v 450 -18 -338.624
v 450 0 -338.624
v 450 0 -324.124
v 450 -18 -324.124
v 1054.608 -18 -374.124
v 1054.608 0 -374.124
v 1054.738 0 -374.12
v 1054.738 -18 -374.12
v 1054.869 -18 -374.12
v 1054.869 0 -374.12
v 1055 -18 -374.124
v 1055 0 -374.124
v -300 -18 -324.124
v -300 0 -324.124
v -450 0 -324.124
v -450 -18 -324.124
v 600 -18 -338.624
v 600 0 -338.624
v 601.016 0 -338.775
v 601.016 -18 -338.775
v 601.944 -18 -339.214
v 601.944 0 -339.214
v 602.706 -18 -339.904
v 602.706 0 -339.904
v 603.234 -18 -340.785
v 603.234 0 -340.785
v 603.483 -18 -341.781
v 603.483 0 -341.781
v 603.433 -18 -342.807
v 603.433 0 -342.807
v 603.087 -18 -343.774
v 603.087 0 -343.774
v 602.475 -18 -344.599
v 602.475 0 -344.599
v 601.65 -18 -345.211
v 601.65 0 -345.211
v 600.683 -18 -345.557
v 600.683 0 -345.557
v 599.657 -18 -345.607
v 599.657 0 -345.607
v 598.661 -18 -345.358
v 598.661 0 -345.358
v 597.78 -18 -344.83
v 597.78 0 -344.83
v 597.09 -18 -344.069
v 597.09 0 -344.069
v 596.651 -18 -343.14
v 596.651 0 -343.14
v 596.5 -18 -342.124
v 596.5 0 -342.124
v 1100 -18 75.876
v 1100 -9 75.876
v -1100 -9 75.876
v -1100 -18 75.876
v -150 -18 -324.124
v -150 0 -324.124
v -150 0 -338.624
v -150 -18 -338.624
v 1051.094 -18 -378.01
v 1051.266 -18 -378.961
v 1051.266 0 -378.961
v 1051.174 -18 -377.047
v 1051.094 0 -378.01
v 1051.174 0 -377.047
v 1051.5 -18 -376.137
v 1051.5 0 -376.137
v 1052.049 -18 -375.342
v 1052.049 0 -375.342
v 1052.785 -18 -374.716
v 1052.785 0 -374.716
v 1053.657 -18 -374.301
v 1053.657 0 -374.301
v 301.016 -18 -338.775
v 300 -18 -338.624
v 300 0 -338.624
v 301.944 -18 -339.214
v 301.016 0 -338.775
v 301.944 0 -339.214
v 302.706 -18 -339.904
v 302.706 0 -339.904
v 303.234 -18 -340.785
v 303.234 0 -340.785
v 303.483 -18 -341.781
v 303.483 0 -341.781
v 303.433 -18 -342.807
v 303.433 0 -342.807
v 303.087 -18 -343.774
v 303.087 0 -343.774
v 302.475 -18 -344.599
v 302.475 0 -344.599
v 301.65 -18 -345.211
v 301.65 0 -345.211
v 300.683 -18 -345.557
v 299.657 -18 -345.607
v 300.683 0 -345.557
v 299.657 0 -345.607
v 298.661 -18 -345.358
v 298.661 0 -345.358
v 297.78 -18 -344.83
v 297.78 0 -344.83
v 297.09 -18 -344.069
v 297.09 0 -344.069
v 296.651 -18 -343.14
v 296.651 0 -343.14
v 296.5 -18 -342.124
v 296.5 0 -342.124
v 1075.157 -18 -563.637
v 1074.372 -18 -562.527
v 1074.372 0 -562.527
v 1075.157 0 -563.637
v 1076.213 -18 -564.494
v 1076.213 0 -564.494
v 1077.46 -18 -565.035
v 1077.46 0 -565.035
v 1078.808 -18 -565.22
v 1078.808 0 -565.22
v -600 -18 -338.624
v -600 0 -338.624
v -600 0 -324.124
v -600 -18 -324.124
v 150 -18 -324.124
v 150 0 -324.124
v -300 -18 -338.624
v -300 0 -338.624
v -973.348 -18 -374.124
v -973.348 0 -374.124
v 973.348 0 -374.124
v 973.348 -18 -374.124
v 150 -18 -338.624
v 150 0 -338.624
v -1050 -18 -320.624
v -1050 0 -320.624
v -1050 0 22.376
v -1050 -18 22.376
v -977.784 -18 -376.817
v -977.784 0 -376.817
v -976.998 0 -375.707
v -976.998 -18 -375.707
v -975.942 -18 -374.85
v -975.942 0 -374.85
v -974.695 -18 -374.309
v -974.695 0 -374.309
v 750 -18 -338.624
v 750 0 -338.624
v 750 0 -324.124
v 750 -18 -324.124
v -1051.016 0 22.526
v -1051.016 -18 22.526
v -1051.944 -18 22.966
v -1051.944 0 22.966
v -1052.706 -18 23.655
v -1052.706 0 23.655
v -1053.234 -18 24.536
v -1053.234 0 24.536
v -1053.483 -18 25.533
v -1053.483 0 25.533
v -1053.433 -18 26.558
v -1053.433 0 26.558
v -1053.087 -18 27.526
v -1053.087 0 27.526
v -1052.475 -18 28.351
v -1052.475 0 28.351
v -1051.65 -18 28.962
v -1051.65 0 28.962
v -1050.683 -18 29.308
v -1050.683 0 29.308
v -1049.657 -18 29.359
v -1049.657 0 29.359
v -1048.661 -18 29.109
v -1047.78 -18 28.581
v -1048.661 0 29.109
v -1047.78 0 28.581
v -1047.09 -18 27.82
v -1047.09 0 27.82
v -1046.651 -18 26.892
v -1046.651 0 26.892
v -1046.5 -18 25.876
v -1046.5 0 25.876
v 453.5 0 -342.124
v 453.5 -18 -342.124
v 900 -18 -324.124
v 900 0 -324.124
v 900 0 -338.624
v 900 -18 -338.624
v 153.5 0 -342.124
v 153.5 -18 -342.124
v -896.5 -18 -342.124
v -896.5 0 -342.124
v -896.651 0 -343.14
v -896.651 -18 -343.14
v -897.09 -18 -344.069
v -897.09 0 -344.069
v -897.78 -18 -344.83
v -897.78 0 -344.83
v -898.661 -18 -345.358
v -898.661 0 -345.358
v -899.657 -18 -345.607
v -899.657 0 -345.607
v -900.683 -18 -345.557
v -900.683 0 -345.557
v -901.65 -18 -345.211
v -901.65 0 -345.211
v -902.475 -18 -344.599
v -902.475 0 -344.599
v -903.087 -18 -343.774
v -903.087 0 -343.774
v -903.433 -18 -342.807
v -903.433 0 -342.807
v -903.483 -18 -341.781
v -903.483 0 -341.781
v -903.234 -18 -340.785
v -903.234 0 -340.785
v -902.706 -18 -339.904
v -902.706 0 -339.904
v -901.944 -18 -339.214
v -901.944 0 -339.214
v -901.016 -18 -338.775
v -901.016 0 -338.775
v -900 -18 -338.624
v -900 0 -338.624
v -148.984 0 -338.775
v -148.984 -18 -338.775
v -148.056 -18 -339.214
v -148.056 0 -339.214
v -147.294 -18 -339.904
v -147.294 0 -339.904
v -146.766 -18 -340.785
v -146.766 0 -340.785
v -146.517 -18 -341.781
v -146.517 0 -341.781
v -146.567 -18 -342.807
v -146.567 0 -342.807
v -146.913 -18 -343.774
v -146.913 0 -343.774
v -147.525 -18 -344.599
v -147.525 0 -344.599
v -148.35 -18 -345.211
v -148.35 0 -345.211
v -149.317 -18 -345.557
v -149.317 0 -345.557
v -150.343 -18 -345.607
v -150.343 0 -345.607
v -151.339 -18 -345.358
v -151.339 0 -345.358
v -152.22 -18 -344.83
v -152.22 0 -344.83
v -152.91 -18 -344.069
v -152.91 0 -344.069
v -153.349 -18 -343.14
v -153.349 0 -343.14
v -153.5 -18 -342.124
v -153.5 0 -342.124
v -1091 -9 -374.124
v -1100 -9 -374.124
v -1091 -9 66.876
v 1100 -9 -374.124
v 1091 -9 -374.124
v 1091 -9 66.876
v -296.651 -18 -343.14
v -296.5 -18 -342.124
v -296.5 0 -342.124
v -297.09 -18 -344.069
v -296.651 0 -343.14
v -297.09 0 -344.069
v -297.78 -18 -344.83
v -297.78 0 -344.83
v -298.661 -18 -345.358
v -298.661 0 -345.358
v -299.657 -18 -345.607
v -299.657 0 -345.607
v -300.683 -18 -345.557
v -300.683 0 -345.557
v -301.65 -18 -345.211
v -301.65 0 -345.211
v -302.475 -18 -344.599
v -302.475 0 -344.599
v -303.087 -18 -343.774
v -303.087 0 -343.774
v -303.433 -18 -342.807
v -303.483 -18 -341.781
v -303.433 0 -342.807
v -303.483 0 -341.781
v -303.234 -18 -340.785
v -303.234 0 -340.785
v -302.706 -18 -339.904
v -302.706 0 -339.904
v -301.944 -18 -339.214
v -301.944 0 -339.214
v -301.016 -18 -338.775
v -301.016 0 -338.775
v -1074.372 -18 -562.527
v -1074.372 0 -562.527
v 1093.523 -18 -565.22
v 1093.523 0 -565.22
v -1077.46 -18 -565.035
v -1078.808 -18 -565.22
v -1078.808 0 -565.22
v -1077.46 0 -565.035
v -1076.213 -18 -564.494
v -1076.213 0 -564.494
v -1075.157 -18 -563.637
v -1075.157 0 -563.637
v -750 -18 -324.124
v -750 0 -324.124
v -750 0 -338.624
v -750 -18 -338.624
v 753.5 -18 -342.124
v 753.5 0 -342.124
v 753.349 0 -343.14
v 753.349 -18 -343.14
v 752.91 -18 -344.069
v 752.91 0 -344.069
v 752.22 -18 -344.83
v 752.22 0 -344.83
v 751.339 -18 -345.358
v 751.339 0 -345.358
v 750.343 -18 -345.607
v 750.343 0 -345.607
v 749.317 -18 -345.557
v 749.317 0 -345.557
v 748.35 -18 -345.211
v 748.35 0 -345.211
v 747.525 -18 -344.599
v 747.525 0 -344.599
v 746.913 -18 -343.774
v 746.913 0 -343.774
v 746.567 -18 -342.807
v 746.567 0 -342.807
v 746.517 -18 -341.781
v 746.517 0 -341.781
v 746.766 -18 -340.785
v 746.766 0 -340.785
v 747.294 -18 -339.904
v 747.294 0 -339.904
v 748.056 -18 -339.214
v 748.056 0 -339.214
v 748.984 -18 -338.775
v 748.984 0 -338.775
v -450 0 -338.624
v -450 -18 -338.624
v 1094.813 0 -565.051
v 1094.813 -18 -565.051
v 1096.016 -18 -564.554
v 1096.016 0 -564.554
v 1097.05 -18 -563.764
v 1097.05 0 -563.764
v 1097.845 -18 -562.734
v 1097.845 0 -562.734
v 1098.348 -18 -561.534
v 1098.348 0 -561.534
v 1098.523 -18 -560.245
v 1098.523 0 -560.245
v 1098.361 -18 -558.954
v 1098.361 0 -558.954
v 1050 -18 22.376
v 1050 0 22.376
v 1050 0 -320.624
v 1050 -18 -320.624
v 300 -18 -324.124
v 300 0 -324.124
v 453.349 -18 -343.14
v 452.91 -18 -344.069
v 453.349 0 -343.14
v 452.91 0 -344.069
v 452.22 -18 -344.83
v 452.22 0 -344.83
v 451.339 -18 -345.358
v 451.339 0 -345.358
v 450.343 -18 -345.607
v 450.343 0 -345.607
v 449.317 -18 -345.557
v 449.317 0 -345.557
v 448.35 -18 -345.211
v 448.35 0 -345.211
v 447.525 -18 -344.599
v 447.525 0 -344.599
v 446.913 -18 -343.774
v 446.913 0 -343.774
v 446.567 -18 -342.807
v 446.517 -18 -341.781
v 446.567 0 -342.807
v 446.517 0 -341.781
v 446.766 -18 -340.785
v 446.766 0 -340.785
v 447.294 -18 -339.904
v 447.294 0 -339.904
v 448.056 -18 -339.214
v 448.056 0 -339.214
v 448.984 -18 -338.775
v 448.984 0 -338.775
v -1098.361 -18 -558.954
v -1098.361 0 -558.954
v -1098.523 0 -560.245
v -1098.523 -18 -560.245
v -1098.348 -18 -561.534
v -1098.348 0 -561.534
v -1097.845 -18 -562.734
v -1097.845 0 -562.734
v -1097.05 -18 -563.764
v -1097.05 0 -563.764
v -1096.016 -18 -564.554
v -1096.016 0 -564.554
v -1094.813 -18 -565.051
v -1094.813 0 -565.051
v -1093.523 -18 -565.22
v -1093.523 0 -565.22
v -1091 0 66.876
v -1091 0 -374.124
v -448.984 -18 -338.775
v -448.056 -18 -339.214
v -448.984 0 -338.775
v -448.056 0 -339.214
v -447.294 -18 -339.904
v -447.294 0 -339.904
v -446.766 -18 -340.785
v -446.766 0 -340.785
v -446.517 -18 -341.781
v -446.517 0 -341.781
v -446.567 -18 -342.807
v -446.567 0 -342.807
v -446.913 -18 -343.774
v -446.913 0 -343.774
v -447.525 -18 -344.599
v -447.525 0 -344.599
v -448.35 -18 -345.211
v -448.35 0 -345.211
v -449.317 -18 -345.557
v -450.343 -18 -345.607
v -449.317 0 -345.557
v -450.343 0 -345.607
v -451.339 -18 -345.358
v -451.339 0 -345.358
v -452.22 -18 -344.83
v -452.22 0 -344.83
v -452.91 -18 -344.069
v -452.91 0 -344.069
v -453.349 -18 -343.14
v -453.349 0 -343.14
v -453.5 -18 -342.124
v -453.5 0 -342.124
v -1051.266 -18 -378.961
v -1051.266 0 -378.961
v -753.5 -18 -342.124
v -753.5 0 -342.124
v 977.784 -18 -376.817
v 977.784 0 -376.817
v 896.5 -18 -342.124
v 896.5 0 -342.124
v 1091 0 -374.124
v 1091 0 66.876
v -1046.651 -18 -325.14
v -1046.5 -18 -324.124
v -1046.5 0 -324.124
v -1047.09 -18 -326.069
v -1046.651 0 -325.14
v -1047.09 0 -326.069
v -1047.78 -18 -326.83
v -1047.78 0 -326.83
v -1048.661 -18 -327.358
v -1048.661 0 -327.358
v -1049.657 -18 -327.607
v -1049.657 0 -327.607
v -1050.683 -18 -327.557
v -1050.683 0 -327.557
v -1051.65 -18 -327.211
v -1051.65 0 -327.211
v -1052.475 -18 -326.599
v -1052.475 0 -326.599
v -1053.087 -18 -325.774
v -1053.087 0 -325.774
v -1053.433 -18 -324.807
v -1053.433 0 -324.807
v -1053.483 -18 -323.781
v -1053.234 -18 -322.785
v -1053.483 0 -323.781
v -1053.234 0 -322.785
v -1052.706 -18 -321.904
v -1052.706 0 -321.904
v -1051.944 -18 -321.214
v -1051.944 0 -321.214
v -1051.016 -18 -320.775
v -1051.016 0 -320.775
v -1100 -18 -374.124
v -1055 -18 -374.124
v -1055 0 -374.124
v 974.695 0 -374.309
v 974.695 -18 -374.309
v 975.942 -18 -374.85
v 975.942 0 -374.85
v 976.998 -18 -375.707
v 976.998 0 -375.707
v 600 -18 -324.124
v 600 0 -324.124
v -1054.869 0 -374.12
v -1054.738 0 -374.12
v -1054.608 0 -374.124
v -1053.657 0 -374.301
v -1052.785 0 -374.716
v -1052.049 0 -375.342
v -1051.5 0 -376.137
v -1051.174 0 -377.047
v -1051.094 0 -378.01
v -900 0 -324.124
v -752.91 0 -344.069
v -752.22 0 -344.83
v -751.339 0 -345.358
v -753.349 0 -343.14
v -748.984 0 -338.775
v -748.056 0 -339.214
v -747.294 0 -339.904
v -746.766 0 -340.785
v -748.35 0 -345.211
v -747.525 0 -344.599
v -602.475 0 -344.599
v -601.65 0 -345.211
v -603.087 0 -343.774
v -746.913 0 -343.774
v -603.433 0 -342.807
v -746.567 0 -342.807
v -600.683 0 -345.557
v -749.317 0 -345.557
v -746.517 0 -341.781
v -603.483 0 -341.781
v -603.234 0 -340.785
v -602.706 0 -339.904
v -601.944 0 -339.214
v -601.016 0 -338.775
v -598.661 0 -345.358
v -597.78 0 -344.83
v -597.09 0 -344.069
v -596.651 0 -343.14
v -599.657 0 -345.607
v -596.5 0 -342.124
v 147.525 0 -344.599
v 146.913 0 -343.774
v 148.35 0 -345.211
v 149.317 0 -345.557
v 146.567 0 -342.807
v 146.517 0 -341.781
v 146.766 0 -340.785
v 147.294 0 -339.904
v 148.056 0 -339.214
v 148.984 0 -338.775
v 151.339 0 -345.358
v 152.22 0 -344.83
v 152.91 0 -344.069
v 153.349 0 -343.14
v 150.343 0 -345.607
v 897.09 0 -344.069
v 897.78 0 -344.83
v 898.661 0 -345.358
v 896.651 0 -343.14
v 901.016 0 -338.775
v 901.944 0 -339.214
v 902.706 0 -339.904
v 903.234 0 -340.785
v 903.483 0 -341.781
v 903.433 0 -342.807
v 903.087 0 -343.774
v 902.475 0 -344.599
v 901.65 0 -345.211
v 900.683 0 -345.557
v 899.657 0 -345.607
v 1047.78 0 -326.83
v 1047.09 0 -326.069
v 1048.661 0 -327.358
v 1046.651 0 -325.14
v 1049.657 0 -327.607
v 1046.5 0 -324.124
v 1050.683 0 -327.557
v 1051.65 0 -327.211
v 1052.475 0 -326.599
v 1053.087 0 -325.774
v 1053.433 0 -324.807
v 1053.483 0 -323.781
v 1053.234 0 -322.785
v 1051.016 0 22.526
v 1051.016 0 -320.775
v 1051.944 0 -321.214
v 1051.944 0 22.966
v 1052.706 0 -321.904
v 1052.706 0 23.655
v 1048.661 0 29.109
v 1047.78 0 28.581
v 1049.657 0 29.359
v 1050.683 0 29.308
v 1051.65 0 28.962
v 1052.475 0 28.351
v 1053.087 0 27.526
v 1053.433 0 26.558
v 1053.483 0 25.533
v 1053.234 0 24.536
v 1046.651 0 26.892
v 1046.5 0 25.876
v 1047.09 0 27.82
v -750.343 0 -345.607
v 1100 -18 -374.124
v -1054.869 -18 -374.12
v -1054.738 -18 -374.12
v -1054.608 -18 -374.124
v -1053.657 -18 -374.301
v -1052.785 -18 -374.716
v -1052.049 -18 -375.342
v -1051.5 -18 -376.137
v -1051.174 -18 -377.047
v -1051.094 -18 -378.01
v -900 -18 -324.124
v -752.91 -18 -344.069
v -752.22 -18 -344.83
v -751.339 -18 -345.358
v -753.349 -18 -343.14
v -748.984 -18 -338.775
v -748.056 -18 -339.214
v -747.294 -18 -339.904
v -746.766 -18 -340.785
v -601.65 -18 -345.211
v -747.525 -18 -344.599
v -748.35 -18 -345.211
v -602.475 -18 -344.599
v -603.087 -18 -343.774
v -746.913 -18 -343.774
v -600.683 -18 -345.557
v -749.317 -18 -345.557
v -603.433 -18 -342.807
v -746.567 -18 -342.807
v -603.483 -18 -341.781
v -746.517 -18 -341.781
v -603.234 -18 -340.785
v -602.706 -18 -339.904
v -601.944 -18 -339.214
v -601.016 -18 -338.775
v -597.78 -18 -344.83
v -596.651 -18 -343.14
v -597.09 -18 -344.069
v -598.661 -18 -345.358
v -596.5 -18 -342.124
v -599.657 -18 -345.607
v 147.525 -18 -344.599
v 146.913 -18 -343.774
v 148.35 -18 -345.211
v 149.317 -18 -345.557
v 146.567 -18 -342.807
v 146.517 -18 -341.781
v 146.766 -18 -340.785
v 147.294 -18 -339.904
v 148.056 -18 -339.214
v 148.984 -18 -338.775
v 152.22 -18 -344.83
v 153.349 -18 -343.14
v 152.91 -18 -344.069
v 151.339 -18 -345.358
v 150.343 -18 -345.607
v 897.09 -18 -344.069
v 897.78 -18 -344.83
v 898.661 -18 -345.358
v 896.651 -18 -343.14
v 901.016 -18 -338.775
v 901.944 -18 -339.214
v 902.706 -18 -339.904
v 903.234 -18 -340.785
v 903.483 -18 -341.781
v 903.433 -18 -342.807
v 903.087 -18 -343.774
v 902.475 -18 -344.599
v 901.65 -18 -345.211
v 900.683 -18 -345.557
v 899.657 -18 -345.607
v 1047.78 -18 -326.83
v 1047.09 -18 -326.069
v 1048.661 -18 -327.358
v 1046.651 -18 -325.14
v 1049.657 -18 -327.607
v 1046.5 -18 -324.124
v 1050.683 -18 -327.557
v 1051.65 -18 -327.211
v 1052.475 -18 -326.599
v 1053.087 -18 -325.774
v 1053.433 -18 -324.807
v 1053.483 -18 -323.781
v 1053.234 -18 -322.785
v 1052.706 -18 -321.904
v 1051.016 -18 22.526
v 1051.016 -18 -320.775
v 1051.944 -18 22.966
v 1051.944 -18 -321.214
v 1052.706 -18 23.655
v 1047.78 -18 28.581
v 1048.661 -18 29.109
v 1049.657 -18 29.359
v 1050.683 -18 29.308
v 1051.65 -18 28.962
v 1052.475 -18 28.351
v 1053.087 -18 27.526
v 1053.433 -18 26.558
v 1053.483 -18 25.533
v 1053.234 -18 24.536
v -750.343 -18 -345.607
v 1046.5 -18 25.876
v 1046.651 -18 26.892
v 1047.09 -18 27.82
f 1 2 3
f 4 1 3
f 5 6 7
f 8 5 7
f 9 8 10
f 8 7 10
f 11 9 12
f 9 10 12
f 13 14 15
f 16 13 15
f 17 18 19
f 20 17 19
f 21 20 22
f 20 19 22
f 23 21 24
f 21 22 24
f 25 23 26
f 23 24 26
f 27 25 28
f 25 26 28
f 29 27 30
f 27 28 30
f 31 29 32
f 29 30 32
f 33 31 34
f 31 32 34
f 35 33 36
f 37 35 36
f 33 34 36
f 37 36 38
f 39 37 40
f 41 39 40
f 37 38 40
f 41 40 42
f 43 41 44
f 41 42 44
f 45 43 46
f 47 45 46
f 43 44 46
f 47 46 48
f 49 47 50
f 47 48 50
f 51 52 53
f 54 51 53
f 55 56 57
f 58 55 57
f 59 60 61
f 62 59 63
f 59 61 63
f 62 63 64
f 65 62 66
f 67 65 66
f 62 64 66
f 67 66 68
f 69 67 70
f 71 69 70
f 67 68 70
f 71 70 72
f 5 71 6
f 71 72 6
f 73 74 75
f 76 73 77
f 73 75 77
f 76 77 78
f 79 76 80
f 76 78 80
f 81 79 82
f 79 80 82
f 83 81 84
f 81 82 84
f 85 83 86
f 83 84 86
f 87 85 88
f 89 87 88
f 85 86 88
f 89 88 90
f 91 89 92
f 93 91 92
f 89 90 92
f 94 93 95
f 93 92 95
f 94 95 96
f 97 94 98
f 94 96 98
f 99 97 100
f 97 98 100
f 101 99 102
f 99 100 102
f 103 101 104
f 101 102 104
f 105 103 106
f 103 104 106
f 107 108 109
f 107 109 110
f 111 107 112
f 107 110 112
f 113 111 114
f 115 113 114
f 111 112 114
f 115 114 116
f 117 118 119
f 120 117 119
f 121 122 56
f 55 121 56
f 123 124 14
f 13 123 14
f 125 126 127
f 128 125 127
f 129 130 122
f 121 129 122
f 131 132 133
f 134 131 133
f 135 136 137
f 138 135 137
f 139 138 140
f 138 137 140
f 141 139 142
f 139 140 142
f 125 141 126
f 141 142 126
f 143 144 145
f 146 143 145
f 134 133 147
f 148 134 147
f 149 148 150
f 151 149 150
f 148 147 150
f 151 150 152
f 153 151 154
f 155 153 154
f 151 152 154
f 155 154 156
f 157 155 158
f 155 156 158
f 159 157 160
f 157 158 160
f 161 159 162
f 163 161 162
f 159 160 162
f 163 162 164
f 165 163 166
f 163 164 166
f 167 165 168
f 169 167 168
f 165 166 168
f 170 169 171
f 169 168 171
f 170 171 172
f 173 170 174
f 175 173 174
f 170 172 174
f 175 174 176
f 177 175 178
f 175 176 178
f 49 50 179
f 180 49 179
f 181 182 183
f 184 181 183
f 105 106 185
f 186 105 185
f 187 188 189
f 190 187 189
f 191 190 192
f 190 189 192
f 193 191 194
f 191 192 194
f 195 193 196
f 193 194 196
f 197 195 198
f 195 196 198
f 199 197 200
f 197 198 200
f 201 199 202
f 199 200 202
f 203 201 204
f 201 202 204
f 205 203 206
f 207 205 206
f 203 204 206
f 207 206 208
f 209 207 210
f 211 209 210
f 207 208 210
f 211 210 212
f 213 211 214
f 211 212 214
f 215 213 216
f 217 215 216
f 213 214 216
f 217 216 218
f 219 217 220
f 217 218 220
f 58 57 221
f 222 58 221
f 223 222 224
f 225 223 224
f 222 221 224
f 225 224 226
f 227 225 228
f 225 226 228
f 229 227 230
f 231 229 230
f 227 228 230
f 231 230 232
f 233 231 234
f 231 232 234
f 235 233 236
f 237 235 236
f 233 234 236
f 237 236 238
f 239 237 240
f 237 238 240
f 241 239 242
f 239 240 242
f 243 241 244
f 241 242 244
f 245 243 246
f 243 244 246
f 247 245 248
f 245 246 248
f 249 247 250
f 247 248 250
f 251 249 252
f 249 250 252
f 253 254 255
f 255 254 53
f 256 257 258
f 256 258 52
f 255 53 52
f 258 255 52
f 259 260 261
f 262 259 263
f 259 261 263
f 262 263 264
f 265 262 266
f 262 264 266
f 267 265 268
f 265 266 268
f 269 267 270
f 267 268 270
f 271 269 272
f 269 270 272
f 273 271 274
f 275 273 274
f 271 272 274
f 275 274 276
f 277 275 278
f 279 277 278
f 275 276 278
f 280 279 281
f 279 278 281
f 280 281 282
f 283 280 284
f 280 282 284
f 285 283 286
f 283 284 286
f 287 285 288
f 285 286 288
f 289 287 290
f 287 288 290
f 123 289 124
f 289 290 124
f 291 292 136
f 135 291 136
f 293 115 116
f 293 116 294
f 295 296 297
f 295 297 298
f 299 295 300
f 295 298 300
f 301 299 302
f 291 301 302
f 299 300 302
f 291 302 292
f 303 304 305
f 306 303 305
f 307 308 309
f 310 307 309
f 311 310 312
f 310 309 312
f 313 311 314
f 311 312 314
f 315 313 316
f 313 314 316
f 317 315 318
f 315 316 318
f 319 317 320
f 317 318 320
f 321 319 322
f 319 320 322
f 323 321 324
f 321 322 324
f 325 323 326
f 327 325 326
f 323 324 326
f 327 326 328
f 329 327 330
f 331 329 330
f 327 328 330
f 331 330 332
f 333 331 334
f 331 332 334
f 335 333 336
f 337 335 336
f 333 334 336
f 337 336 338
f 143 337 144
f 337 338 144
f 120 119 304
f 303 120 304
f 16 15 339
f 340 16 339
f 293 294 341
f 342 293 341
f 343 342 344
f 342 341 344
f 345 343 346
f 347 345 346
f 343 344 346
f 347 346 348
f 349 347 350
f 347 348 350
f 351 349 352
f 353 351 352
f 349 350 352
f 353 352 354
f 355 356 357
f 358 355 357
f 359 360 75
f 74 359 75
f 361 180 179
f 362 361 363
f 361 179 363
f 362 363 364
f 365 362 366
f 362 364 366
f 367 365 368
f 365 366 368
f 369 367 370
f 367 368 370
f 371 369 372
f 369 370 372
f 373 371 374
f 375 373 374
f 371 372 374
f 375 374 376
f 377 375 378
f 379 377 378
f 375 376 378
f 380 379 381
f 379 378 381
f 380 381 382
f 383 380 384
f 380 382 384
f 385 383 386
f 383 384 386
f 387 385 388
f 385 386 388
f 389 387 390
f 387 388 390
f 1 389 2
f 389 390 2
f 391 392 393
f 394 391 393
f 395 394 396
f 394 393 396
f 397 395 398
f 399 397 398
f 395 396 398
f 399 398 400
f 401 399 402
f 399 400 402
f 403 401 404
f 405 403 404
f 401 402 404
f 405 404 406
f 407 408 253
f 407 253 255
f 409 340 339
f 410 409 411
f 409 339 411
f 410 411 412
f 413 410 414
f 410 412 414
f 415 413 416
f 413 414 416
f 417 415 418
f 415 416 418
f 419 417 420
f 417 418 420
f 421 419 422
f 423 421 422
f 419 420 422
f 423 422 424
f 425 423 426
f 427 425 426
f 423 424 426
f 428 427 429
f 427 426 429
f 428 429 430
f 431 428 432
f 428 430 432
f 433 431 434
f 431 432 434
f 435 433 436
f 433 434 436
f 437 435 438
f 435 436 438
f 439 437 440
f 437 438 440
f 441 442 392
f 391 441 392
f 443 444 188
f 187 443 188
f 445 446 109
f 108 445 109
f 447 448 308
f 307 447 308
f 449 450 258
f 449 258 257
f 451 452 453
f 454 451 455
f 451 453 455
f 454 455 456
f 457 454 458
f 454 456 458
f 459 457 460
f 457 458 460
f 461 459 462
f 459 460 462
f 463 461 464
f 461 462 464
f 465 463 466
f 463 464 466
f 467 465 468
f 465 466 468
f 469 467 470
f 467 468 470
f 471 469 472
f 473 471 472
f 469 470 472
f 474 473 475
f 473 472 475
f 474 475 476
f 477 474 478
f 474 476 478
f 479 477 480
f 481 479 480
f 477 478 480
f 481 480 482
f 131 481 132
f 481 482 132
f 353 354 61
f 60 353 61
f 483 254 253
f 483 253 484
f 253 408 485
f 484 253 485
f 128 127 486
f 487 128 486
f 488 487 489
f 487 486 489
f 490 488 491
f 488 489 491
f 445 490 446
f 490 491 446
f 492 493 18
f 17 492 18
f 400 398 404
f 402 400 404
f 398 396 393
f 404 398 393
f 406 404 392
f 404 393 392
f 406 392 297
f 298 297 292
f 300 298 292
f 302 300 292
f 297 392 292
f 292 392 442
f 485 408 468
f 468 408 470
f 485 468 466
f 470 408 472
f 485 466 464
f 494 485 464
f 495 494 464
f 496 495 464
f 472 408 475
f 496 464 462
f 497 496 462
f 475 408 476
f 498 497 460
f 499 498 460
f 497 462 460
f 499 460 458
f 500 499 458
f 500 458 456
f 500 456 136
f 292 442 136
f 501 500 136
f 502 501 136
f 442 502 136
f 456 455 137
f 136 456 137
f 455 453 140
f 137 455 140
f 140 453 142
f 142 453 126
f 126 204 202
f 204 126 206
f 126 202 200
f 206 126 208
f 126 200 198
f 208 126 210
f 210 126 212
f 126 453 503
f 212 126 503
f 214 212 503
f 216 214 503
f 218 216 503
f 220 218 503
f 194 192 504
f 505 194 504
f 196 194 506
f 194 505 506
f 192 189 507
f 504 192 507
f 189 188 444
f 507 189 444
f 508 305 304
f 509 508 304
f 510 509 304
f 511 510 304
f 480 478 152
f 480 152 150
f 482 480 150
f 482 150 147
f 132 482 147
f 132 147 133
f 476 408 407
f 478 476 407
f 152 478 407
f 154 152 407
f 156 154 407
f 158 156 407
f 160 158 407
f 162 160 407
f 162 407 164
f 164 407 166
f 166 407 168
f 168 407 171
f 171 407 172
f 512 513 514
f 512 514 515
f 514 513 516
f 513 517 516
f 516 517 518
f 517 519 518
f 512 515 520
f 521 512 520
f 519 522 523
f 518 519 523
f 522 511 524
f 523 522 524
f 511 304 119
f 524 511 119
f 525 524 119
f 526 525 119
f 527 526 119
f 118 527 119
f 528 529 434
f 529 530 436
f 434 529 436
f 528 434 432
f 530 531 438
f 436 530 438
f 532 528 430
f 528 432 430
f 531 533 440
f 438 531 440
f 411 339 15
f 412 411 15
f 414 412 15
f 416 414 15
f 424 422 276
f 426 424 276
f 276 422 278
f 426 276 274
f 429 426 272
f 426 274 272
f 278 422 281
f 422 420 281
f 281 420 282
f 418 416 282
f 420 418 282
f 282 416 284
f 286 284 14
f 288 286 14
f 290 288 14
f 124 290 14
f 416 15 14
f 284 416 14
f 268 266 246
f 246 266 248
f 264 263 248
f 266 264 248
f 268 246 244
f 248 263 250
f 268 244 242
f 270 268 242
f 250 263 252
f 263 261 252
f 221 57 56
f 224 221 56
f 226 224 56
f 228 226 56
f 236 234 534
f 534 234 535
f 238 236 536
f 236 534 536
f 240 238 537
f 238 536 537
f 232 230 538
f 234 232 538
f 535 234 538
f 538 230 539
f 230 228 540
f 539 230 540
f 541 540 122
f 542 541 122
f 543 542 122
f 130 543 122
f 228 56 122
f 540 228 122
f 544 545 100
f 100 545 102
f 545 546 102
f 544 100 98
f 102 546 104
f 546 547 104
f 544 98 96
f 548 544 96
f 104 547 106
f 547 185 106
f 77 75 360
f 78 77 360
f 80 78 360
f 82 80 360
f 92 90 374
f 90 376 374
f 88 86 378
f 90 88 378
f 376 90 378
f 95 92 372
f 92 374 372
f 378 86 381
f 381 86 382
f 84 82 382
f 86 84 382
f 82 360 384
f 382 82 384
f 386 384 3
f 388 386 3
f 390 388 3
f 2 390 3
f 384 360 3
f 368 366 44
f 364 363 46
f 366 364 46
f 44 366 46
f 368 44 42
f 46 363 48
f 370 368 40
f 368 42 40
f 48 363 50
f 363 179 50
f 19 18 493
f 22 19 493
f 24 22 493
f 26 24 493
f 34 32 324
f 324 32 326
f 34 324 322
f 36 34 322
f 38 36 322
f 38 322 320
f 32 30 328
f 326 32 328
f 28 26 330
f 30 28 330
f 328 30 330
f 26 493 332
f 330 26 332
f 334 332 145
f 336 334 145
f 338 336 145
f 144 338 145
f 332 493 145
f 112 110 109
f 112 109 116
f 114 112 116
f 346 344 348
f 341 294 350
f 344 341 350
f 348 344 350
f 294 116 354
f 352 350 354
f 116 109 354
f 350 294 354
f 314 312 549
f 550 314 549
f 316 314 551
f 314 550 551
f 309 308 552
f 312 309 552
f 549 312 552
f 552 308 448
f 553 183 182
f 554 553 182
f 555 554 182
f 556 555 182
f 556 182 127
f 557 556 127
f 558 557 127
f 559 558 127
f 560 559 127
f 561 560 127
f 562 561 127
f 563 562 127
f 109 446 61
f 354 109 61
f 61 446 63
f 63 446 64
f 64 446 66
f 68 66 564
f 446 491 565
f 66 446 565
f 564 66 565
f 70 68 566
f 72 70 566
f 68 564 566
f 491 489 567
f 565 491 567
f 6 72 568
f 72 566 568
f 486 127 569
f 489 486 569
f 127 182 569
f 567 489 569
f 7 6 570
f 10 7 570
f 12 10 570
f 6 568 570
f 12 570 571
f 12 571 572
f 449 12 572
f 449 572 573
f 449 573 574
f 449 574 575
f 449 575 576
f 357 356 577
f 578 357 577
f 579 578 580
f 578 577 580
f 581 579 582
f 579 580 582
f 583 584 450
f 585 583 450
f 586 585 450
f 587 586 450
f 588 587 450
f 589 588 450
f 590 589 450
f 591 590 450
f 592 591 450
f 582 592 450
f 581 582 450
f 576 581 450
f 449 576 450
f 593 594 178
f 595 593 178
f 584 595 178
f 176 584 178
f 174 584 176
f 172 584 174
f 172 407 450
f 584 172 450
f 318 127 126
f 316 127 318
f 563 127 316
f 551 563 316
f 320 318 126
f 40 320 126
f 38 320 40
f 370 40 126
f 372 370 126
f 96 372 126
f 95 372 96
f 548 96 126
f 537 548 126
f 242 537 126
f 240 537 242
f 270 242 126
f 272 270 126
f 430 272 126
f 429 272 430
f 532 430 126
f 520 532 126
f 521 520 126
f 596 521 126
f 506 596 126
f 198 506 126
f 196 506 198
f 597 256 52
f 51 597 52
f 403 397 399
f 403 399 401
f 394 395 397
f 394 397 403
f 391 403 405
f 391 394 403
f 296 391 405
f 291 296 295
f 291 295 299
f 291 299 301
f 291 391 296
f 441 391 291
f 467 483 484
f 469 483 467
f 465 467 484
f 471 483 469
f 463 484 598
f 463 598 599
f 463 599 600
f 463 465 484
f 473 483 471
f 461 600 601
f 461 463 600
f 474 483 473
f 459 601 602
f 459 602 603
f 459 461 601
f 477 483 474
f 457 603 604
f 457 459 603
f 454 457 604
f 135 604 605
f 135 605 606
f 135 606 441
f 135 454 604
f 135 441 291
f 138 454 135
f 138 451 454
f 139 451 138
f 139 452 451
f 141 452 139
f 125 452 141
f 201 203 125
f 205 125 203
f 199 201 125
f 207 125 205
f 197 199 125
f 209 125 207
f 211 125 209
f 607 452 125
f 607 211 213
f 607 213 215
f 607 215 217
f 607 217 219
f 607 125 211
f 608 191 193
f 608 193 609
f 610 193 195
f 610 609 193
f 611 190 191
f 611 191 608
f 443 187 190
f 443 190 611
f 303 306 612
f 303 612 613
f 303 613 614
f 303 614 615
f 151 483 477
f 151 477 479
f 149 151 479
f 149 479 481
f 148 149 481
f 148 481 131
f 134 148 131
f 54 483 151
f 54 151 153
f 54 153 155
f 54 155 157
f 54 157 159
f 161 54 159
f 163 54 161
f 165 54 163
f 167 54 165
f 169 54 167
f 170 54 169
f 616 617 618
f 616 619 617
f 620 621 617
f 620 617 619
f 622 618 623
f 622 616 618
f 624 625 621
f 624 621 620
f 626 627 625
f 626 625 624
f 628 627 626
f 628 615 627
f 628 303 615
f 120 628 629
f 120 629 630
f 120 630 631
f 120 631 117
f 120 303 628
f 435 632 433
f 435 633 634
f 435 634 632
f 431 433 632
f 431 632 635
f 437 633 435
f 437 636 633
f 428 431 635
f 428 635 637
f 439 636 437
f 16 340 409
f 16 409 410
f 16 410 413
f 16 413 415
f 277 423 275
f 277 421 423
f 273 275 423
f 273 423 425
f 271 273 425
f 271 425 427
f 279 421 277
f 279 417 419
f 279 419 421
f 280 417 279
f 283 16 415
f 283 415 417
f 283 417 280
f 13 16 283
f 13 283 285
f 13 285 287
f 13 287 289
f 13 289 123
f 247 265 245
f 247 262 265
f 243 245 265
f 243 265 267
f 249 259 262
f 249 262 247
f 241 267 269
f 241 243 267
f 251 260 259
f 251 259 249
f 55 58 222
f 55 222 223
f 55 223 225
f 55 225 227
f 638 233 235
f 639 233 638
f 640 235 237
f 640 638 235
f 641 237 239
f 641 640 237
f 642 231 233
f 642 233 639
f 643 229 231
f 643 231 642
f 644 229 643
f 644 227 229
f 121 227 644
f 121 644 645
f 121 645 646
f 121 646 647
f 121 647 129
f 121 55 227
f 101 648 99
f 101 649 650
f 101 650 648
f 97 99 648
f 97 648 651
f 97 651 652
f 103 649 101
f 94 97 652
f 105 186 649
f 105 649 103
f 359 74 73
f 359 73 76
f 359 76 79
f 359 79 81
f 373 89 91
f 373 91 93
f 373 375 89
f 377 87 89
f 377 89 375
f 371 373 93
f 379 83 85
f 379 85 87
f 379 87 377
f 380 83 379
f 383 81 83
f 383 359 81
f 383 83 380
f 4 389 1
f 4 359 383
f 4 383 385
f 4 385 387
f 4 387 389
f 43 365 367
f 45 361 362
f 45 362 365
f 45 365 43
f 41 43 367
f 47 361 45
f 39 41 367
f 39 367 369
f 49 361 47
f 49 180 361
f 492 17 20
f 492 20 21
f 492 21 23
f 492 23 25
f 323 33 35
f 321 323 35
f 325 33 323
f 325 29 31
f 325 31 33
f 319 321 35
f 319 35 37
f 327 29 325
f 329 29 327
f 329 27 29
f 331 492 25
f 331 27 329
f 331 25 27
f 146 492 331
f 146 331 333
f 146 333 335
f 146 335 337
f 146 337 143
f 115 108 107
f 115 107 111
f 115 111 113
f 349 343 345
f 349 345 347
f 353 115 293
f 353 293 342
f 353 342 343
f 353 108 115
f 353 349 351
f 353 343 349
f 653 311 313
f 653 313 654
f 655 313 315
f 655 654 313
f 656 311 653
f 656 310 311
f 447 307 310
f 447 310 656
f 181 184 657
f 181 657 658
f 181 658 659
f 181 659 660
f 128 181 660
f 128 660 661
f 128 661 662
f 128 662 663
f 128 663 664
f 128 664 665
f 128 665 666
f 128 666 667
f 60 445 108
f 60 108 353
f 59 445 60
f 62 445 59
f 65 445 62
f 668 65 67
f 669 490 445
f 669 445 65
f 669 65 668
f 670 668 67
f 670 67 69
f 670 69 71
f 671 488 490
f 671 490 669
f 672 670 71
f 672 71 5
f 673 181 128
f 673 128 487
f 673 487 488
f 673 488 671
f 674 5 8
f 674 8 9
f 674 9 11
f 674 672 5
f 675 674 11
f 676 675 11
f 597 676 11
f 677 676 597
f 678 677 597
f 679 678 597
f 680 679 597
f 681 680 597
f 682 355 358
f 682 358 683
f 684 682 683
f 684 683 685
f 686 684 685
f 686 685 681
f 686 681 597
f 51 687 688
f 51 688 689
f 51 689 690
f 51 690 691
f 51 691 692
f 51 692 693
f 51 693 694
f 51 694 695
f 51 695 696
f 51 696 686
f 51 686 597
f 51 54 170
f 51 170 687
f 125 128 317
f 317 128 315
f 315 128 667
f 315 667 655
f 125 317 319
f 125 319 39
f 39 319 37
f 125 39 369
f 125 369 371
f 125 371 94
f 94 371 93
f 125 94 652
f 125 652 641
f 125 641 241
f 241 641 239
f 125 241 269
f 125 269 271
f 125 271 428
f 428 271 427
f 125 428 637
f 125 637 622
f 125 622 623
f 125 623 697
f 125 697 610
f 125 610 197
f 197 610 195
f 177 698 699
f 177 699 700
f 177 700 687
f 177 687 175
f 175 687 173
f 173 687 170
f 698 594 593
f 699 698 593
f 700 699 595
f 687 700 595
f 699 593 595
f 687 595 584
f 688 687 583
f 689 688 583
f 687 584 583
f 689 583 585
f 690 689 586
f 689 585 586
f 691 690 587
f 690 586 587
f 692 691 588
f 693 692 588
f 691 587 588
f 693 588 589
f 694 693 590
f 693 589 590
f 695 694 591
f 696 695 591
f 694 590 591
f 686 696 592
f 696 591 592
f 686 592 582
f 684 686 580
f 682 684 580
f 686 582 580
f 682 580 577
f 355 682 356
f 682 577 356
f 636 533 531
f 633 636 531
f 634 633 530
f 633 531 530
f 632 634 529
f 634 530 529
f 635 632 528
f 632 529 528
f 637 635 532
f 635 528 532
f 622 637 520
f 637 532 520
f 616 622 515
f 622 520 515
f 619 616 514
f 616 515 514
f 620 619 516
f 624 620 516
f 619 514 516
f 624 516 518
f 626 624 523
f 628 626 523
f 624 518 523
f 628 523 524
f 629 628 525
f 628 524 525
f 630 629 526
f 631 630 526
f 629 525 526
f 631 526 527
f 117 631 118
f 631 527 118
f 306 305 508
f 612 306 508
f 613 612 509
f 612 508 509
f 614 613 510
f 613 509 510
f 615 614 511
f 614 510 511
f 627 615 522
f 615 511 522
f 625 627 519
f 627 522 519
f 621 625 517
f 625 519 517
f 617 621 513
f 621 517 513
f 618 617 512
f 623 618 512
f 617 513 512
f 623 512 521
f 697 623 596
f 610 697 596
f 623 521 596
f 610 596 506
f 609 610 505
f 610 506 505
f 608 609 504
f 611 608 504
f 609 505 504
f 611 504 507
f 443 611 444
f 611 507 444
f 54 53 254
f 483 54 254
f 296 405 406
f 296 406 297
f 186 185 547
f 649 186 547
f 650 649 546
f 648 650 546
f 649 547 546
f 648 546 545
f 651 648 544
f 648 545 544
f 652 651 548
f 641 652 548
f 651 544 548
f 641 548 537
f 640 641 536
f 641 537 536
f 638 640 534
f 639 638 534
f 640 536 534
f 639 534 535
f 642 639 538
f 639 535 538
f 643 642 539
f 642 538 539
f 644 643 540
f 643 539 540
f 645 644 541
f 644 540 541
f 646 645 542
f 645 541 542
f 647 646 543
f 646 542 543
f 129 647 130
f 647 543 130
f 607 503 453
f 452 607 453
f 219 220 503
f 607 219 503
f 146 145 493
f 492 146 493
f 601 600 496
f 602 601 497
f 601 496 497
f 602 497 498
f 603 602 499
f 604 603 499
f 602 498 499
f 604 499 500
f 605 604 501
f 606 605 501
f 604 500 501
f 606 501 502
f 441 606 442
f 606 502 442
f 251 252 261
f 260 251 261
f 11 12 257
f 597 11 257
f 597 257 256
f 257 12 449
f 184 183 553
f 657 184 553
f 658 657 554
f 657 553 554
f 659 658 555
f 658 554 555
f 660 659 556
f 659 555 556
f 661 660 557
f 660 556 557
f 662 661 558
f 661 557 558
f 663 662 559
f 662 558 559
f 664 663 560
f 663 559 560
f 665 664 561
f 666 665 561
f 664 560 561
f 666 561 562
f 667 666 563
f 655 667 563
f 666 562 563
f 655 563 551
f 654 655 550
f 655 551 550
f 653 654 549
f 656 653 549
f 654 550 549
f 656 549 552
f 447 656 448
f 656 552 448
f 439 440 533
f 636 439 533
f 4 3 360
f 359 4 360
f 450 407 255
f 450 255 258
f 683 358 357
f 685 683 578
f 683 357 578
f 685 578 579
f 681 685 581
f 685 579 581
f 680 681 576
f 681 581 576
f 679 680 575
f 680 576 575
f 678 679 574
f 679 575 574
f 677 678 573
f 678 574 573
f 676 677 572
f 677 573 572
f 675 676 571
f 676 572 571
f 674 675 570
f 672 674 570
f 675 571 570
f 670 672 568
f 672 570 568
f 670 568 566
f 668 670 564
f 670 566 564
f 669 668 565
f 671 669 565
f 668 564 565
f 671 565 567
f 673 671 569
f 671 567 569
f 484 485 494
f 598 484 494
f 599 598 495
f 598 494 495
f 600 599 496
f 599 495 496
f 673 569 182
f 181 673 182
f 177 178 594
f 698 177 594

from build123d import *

# Parameters (mm, degrees)
F0_W     = 9
F0_H     = 9
F0_H_2   = 441
F1_DEPTH = 18
F2_DEPTH = 9


# Not quite as in the source:
# - ends of sketch curves that miss each other by under 0.0002 mm in the source are joined


with BuildPart() as f1:
    # F0 (on Front) → F1 (new body)
    with BuildSketch(Plane.XZ):
        with Locations((-1095.5, 71.3756743552)):
            Rectangle(F0_W, F0_H)
        with BuildLine():
            Line((0, 66.8756743552), (-1091, 66.8756743552))
            Line((-1091, 66.8756743552), (-1091, -374.1243256448))
            Line((-1091, -374.1243256448), (-1055, -374.1243256448))
            ThreePointArc((-1055, -374.1243256448), (-1054.8038113281, -374.1191399972), (-1054.6076226562, -374.1243256448))
            Line((-1054.6076226562, -374.1243256448), (-973.3476458471, -374.1243256448))
            Line((-973.3476458471, -374.1243256448), (0, -374.1243256448))
            Line((0, -374.1243256448), (973.3476458471, -374.1243256448))
            Line((973.3476458471, -374.1243256448), (1054.6076226562, -374.1243256448))
            ThreePointArc((1054.6076226562, -374.1243256448), (1054.8038113281, -374.1191399972), (1055, -374.1243256448))
            Line((1055, -374.1243256448), (1091, -374.1243256448))
            Line((1091, -374.1243256448), (1091, -365.1243256448))
            Line((1091, -365.1243256448), (1091, -365.0378882885))
            Line((1091, -365.0378882885), (1091, 66.8756743552))
            Line((1091, 66.8756743552), (0, 66.8756743552))
        make_face()
        with BuildLine():
            Line((-1050, -320.6243256448), (-1050, 22.3756743552))
            ThreePointArc((-1050, 22.3756743552), (-1052.4748737342, 28.3505480894), (-1046.5, 25.8756743552))
            Line((-1046.5, 25.8756743552), (0, 25.8756743552))
            Line((0, 25.8756743552), (1046.5, 25.8756743552))
            ThreePointArc((1046.5, 25.8756743552), (1052.4748737342, 28.3505480894), (1050, 22.3756743552))
            Line((1050, 22.3756743552), (1050, -320.6243256448))
            ThreePointArc((1050, -320.6243256448), (1052.4748737342, -326.5991993789), (1046.5, -324.1243256448))
            Line((1046.5, -324.1243256448), (900, -324.1243256448))
            Line((900, -324.1243256448), (900, -338.6243256448))
            ThreePointArc((900, -338.6243256448), (902.4748737342, -344.5991993789), (896.5, -342.1243256448))
            Line((896.5, -342.1243256448), (753.5000238419, -342.1243256448))
            ThreePointArc((753.5000238419, -342.1243256448), (747.5251501077, -344.5991993789), (750.0000238419, -338.6243256448))
            Line((750.0000238419, -338.6243256448), (750.0000238419, -324.1243256448))
            Line((750.0000238419, -324.1243256448), (600.0000238419, -324.1243256448))
            Line((600.0000238419, -324.1243256448), (600, -338.6243256448))
            ThreePointArc((600, -338.6243256448), (602.4748737342, -344.5991993789), (596.5, -342.1243256448))
            Line((596.5, -342.1243256448), (453.5000238419, -342.1243256448))
            ThreePointArc((453.5000238419, -342.1243256448), (447.5251501077, -344.5991993789), (450.0000238419, -338.6243256448))
            Line((450.0000238419, -338.6243256448), (450.0000238419, -324.1243256448))
            Line((450.0000238419, -324.1243256448), (300.0000238419, -324.1243256448))
            Line((300.0000238419, -324.1243256448), (300, -338.6243256448))
            ThreePointArc((300, -338.6243256448), (302.4748737342, -344.5991993789), (296.5, -342.1243256448))
            Line((296.5, -342.1243256448), (153.5000238419, -342.1243256448))
            ThreePointArc((153.5000238419, -342.1243256448), (147.5251501077, -344.5991993789), (150.0000238419, -338.6243256448))
            Line((150.0000238419, -338.6243256448), (150.0000238419, -324.1243256448))
            Line((150.0000238419, -324.1243256448), (2.38419e-05, -324.1243256448))
            Line((2.38419e-05, -324.1243256448), (-150.0000238419, -324.1243256448))
            Line((-150.0000238419, -324.1243256448), (-150.0000238419, -338.6243256448))
            ThreePointArc((-150.0000238419, -338.6243256448), (-147.5251501077, -344.5991993789), (-153.5000238419, -342.1243256448))
            Line((-153.5000238419, -342.1243256448), (-296.5, -342.1243256448))
            ThreePointArc((-296.5, -342.1243256448), (-302.4748737342, -344.5991993789), (-300, -338.6243256448))
            Line((-300, -338.6243256448), (-300, -324.1243256448))
            Line((-300, -324.1243256448), (-450.0000238419, -324.1243256448))
            Line((-450.0000238419, -324.1243256448), (-450.0000238419, -338.6243256448))
            ThreePointArc((-450.0000238419, -338.6243256448), (-447.5251501077, -344.5991993789), (-453.5000238419, -342.1243256448))
            Line((-453.5000238419, -342.1243256448), (-596.5, -342.1243256448))
            ThreePointArc((-596.5, -342.1243256448), (-602.4748737342, -344.5991993789), (-600, -338.6243256448))
            Line((-600, -338.6243256448), (-600, -324.1243256448))
            Line((-600, -324.1243256448), (-750.0000238419, -324.1243256448))
            Line((-750.0000238419, -324.1243256448), (-750.0000238419, -338.6243256448))
            ThreePointArc((-750.0000238419, -338.6243256448), (-747.5251501077, -344.5991993789), (-753.5000238419, -342.1243256448))
            Line((-753.5000238419, -342.1243256448), (-896.5, -342.1243256448))
            ThreePointArc((-896.5, -342.1243256448), (-902.4748737342, -344.5991993789), (-900, -338.6243256448))
            Line((-900, -338.6243256448), (-900, -324.1243256448))
            Line((-900, -324.1243256448), (-1046.5, -324.1243256448))
            ThreePointArc((-1046.5, -324.1243256448), (-1052.4748737342, -326.5991993789), (-1050, -320.6243256448))
        make_face(mode=Mode.SUBTRACT)
        with BuildLine():
            Line((-973.3476458471, -374.1243256448), (-1054.6076226562, -374.1243256448))
            ThreePointArc((-1054.6076226562, -374.1243256448), (-1051.7483407187, -375.721921149), (-1051.265639742, -378.9614896944))
            Line((-1051.265639742, -378.9614896944), (-1098.3606008427, -558.954299013))
            ThreePointArc((-1098.3606008427, -558.954299013), (-1097.4812264988, -563.2754093644), (-1093.523436793, -565.219938755))
            Line((-1093.523436793, -565.219938755), (-1078.8076104242, -565.219938755))
            ThreePointArc((-1078.8076104242, -565.219938755), (-1076.2129629213, -564.4940239596), (-1074.371712623, -562.5270604893))
            Line((-1074.371712623, -562.5270604893), (-977.7835436484, -376.8172039105))
            ThreePointArc((-977.7835436484, -376.8172039105), (-975.94229335, -374.8502404402), (-973.3476458471, -374.1243256448))
        make_face()
        Polygon((1100, 66.8756743552), (1091, 66.8756743552), (1091, -365.0378882885), (1091, -365.1243256448), (1091, -374.1243256448), (1100, -374.1243256448), align=None)
        Polygon((0, 75.8756743552), (-1091, 75.8756743552), (-1091, 66.8756743552), (0, 66.8756743552), (1091, 66.8756743552), (1091, 75.8756743552), align=None)
        with Locations((-1095.5, -153.6243256448)):
            Rectangle(F0_W, F0_H_2)
        with Locations((1095.5, 71.3756743552)):
            Rectangle(F0_W, F0_H)
        with BuildLine():
            Line((1054.6076226562, -374.1243256448), (973.3476458471, -374.1243256448))
            ThreePointArc((973.3476458471, -374.1243256448), (975.94229335, -374.8502404402), (977.7835436484, -376.8172039105))
            Line((977.7835436484, -376.8172039105), (1074.371712623, -562.5270604893))
            ThreePointArc((1074.371712623, -562.5270604893), (1076.2129629213, -564.4940239596), (1078.8076104242, -565.219938755))
            Line((1078.8076104242, -565.219938755), (1093.523436793, -565.219938755))
            ThreePointArc((1093.523436793, -565.219938755), (1097.4812264988, -563.2754093644), (1098.3606008427, -558.954299013))
            Line((1098.3606008427, -558.954299013), (1051.265639742, -378.9614896944))
            ThreePointArc((1051.265639742, -378.9614896944), (1051.7483407187, -375.721921149), (1054.6076226562, -374.1243256448))
        make_face()
    extrude(amount=F1_DEPTH)

    # F0 (on Front) → F2 (cut)
    with BuildSketch(Plane.XZ):
        Polygon((0, 75.8756743552), (-1091, 75.8756743552), (-1091, 66.8756743552), (0, 66.8756743552), (1091, 66.8756743552), (1091, 75.8756743552), align=None)
        with Locations((1095.5, 71.3756743552)):
            Rectangle(F0_W, F0_H)
        with Locations((-1095.5, -153.6243256448)):
            Rectangle(F0_W, F0_H_2)
        with Locations((-1095.5, 71.3756743552)):
            Rectangle(F0_W, F0_H)
        Polygon((1100, 66.8756743552), (1091, 66.8756743552), (1091, -365.0378882885), (1091, -365.1243256448), (1091, -374.1243256448), (1100, -374.1243256448), align=None)
    extrude(amount=F2_DEPTH, mode=Mode.SUBTRACT)


solid = f1.part
